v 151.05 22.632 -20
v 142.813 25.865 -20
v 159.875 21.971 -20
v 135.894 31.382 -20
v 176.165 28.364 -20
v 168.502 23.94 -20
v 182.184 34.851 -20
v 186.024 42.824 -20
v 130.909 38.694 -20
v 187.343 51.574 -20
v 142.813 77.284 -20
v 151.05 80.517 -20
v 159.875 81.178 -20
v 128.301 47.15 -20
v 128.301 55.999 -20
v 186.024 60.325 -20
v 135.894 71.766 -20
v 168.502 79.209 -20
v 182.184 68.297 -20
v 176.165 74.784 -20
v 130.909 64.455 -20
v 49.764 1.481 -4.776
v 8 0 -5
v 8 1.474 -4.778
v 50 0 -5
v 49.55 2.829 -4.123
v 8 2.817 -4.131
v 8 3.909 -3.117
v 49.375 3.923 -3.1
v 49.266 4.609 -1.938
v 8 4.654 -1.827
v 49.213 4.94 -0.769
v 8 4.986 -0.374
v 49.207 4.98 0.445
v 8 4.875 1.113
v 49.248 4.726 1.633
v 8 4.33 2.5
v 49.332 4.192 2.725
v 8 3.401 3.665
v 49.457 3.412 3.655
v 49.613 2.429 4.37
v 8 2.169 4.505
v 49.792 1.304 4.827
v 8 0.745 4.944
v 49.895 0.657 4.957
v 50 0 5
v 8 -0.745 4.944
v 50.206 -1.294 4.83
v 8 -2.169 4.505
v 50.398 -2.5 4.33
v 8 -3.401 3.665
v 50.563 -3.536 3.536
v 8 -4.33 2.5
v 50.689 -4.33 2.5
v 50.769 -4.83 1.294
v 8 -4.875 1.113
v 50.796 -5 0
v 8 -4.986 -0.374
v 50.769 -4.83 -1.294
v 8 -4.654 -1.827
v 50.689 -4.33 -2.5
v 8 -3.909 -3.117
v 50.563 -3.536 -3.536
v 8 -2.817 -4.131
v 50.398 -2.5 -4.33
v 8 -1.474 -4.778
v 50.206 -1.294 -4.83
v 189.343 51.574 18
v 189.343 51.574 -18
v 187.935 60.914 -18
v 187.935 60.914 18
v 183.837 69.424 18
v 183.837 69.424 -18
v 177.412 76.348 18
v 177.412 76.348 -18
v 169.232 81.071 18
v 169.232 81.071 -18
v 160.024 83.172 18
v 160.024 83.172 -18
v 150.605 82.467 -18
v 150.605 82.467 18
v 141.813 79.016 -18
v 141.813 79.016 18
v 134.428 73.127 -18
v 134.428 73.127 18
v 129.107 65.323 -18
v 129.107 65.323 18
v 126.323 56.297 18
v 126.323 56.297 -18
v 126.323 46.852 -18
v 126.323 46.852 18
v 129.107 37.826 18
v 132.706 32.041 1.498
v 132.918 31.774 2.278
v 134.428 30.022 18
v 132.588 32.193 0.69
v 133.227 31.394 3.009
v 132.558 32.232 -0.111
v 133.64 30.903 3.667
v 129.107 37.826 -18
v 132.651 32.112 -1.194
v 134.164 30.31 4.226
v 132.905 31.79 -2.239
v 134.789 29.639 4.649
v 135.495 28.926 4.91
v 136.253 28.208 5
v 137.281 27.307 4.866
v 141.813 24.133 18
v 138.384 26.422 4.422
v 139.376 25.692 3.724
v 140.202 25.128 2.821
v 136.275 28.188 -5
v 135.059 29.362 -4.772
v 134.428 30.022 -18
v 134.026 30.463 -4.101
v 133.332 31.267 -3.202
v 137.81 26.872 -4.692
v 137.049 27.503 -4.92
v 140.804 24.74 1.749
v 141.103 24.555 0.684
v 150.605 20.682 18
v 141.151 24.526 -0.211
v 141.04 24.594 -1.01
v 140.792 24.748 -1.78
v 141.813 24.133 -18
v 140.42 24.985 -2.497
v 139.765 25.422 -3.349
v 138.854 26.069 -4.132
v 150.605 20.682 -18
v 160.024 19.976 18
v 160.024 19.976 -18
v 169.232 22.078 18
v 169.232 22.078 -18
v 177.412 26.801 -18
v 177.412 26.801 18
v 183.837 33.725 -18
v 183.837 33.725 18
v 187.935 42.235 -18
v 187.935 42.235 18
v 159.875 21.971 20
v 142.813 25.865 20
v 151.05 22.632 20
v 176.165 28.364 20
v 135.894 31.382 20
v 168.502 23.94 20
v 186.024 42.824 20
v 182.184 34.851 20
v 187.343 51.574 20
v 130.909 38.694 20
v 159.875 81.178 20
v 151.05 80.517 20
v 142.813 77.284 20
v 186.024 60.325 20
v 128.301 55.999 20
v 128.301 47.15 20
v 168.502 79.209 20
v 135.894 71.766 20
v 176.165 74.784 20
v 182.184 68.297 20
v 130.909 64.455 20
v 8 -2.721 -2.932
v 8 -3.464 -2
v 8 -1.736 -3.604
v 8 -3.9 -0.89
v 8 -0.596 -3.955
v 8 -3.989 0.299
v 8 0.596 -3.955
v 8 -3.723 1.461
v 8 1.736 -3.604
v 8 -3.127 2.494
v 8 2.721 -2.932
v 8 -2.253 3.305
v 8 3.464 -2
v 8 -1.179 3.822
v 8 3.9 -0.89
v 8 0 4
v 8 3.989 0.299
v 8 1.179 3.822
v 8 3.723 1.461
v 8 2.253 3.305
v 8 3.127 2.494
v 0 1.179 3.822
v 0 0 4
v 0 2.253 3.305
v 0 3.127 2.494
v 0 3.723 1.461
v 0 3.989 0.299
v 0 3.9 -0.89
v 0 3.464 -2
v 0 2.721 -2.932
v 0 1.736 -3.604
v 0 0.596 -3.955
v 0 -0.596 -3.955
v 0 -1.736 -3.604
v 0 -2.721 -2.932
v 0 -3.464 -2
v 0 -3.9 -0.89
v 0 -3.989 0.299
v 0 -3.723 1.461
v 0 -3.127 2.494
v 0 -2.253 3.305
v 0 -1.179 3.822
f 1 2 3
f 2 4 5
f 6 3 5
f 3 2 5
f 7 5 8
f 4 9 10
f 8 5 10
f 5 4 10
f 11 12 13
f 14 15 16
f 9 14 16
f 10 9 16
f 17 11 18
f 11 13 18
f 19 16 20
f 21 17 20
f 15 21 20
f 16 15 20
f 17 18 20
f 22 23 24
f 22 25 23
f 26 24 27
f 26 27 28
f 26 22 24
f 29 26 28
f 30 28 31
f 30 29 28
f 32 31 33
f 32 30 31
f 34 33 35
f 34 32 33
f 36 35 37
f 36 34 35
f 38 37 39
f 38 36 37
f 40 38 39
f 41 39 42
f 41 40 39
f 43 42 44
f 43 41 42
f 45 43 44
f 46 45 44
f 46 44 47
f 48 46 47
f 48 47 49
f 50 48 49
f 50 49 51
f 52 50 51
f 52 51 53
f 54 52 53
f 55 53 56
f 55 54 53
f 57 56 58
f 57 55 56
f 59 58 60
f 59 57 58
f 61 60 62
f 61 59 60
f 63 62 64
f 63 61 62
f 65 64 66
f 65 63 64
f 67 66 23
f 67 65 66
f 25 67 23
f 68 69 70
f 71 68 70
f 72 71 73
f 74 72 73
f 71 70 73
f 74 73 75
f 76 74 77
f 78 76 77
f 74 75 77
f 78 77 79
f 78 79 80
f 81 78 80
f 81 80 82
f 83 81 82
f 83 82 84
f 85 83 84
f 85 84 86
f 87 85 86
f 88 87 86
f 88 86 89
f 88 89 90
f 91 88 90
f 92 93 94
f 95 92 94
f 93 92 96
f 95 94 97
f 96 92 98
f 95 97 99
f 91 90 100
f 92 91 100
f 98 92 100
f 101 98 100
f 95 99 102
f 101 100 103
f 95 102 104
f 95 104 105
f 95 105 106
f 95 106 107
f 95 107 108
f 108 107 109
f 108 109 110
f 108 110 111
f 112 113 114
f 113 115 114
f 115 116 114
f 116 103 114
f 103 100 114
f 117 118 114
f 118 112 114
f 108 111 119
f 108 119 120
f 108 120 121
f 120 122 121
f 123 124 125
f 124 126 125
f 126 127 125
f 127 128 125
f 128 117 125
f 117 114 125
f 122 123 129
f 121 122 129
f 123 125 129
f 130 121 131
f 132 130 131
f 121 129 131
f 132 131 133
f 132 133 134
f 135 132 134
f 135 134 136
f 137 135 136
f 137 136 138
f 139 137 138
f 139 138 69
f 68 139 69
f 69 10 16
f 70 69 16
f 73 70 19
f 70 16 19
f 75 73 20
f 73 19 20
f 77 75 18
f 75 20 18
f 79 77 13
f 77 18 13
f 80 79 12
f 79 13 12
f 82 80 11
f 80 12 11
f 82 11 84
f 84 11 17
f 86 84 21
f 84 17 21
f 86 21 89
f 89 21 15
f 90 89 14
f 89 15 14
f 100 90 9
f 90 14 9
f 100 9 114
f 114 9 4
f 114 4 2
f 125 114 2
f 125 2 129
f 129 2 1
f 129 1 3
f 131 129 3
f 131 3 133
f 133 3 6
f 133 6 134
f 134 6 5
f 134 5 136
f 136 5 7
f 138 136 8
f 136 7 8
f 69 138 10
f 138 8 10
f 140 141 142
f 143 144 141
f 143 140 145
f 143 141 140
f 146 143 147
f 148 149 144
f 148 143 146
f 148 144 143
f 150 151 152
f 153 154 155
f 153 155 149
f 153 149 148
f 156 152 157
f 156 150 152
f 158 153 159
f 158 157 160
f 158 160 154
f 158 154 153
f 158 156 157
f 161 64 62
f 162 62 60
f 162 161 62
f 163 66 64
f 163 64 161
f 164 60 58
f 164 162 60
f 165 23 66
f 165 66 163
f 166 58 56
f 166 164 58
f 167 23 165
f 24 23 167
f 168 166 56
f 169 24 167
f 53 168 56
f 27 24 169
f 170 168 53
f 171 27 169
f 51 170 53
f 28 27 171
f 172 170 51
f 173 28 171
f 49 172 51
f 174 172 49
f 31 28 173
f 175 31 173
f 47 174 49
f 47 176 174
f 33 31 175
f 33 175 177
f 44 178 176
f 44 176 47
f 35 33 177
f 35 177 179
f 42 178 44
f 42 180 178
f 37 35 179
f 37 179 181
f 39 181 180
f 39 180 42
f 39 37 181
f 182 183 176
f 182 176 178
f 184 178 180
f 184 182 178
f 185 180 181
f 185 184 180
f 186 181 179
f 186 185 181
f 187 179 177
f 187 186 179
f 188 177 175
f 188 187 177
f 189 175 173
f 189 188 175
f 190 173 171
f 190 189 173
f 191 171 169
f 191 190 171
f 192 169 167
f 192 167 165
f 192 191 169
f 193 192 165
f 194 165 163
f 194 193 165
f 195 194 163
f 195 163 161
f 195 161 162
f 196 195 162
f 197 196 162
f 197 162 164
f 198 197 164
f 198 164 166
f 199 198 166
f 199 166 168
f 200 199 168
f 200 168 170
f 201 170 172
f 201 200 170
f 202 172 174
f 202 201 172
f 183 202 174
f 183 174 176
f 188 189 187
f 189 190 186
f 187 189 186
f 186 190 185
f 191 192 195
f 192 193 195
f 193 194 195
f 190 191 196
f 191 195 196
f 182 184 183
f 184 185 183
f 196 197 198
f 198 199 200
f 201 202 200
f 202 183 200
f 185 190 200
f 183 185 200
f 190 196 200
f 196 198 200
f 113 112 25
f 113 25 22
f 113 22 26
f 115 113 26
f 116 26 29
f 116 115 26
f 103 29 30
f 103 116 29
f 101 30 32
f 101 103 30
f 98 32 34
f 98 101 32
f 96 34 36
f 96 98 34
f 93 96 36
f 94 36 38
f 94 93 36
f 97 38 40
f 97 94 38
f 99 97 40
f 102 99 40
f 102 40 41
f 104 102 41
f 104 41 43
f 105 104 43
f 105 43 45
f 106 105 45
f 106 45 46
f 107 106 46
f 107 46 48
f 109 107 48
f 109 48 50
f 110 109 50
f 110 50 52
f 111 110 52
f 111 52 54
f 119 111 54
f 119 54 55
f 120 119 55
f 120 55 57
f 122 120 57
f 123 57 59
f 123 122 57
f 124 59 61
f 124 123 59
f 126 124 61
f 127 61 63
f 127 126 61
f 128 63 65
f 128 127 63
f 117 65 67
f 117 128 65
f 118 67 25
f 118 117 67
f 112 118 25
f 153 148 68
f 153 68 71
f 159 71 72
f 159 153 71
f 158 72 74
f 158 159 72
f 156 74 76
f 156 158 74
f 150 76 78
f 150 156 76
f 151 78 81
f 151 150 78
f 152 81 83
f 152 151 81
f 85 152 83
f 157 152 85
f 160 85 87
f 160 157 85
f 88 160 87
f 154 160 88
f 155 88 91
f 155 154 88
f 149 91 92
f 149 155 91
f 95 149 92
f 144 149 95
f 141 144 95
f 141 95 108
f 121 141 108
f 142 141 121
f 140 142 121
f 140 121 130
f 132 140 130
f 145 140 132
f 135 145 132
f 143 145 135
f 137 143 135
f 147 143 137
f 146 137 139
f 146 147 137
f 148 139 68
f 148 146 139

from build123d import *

# Parameters (mm, degrees)
SKETCH2_R                = 5
BOSS_EXTRUDE1_DEPTH      = 20
BOSS_EXTRUDE1_DEPTH_BACK = 20
SKETCH3_R                = 31.686663215
SKETCH4_R                = 8.078892956
SKETCH4_R_2              = 4
CUT_EXTRUDE1_DEPTH       = 8
CHAMFER1_SIZE            = 2


with BuildPart() as part:
    # Sweep1: sweep along a path in Sketch1
    with BuildLine(Plane.XY) as sweep1_path:
        Line((0, 0), (50, 0))
        Line((50, 0), (145.05509307, 31.056871726))
    # Sketch2 → Sweep1 (sweep)
    with BuildSketch(Plane(origin=(0, 0, 0), x_dir=(0, 0, -1), z_dir=(1, 0, 0))):
        Circle(SKETCH2_R)
    sweep(path=sweep1_path.line, transition=Transition.RIGHT)

    # Sketch3 → Boss-Extrude1 (add, two sides: drawn at the far end of the back side and taken through both)
    with BuildSketch(Plane.XY.offset(-BOSS_EXTRUDE1_DEPTH_BACK)):
        with Locations((157.656014811, 51.574343957)):
            Circle(SKETCH3_R)
    extrude(amount=BOSS_EXTRUDE1_DEPTH + BOSS_EXTRUDE1_DEPTH_BACK)

    # Sketch4 → Cut-Extrude1 (cut)
    with BuildSketch(Plane.ZY):
        Circle(SKETCH4_R)
        Circle(SKETCH4_R_2, mode=Mode.SUBTRACT)
    extrude(amount=-CUT_EXTRUDE1_DEPTH, mode=Mode.SUBTRACT)

    # Chamfer1
    chamfer1_edges = [part.edges().sort_by_distance(p)[0] for p in [
        (125.969351596, 51.574343957, -20),
        (125.969351596, 51.574343957, 20),
    ]]
    chamfer(chamfer1_edges, length=CHAMFER1_SIZE)


solid = part.part
